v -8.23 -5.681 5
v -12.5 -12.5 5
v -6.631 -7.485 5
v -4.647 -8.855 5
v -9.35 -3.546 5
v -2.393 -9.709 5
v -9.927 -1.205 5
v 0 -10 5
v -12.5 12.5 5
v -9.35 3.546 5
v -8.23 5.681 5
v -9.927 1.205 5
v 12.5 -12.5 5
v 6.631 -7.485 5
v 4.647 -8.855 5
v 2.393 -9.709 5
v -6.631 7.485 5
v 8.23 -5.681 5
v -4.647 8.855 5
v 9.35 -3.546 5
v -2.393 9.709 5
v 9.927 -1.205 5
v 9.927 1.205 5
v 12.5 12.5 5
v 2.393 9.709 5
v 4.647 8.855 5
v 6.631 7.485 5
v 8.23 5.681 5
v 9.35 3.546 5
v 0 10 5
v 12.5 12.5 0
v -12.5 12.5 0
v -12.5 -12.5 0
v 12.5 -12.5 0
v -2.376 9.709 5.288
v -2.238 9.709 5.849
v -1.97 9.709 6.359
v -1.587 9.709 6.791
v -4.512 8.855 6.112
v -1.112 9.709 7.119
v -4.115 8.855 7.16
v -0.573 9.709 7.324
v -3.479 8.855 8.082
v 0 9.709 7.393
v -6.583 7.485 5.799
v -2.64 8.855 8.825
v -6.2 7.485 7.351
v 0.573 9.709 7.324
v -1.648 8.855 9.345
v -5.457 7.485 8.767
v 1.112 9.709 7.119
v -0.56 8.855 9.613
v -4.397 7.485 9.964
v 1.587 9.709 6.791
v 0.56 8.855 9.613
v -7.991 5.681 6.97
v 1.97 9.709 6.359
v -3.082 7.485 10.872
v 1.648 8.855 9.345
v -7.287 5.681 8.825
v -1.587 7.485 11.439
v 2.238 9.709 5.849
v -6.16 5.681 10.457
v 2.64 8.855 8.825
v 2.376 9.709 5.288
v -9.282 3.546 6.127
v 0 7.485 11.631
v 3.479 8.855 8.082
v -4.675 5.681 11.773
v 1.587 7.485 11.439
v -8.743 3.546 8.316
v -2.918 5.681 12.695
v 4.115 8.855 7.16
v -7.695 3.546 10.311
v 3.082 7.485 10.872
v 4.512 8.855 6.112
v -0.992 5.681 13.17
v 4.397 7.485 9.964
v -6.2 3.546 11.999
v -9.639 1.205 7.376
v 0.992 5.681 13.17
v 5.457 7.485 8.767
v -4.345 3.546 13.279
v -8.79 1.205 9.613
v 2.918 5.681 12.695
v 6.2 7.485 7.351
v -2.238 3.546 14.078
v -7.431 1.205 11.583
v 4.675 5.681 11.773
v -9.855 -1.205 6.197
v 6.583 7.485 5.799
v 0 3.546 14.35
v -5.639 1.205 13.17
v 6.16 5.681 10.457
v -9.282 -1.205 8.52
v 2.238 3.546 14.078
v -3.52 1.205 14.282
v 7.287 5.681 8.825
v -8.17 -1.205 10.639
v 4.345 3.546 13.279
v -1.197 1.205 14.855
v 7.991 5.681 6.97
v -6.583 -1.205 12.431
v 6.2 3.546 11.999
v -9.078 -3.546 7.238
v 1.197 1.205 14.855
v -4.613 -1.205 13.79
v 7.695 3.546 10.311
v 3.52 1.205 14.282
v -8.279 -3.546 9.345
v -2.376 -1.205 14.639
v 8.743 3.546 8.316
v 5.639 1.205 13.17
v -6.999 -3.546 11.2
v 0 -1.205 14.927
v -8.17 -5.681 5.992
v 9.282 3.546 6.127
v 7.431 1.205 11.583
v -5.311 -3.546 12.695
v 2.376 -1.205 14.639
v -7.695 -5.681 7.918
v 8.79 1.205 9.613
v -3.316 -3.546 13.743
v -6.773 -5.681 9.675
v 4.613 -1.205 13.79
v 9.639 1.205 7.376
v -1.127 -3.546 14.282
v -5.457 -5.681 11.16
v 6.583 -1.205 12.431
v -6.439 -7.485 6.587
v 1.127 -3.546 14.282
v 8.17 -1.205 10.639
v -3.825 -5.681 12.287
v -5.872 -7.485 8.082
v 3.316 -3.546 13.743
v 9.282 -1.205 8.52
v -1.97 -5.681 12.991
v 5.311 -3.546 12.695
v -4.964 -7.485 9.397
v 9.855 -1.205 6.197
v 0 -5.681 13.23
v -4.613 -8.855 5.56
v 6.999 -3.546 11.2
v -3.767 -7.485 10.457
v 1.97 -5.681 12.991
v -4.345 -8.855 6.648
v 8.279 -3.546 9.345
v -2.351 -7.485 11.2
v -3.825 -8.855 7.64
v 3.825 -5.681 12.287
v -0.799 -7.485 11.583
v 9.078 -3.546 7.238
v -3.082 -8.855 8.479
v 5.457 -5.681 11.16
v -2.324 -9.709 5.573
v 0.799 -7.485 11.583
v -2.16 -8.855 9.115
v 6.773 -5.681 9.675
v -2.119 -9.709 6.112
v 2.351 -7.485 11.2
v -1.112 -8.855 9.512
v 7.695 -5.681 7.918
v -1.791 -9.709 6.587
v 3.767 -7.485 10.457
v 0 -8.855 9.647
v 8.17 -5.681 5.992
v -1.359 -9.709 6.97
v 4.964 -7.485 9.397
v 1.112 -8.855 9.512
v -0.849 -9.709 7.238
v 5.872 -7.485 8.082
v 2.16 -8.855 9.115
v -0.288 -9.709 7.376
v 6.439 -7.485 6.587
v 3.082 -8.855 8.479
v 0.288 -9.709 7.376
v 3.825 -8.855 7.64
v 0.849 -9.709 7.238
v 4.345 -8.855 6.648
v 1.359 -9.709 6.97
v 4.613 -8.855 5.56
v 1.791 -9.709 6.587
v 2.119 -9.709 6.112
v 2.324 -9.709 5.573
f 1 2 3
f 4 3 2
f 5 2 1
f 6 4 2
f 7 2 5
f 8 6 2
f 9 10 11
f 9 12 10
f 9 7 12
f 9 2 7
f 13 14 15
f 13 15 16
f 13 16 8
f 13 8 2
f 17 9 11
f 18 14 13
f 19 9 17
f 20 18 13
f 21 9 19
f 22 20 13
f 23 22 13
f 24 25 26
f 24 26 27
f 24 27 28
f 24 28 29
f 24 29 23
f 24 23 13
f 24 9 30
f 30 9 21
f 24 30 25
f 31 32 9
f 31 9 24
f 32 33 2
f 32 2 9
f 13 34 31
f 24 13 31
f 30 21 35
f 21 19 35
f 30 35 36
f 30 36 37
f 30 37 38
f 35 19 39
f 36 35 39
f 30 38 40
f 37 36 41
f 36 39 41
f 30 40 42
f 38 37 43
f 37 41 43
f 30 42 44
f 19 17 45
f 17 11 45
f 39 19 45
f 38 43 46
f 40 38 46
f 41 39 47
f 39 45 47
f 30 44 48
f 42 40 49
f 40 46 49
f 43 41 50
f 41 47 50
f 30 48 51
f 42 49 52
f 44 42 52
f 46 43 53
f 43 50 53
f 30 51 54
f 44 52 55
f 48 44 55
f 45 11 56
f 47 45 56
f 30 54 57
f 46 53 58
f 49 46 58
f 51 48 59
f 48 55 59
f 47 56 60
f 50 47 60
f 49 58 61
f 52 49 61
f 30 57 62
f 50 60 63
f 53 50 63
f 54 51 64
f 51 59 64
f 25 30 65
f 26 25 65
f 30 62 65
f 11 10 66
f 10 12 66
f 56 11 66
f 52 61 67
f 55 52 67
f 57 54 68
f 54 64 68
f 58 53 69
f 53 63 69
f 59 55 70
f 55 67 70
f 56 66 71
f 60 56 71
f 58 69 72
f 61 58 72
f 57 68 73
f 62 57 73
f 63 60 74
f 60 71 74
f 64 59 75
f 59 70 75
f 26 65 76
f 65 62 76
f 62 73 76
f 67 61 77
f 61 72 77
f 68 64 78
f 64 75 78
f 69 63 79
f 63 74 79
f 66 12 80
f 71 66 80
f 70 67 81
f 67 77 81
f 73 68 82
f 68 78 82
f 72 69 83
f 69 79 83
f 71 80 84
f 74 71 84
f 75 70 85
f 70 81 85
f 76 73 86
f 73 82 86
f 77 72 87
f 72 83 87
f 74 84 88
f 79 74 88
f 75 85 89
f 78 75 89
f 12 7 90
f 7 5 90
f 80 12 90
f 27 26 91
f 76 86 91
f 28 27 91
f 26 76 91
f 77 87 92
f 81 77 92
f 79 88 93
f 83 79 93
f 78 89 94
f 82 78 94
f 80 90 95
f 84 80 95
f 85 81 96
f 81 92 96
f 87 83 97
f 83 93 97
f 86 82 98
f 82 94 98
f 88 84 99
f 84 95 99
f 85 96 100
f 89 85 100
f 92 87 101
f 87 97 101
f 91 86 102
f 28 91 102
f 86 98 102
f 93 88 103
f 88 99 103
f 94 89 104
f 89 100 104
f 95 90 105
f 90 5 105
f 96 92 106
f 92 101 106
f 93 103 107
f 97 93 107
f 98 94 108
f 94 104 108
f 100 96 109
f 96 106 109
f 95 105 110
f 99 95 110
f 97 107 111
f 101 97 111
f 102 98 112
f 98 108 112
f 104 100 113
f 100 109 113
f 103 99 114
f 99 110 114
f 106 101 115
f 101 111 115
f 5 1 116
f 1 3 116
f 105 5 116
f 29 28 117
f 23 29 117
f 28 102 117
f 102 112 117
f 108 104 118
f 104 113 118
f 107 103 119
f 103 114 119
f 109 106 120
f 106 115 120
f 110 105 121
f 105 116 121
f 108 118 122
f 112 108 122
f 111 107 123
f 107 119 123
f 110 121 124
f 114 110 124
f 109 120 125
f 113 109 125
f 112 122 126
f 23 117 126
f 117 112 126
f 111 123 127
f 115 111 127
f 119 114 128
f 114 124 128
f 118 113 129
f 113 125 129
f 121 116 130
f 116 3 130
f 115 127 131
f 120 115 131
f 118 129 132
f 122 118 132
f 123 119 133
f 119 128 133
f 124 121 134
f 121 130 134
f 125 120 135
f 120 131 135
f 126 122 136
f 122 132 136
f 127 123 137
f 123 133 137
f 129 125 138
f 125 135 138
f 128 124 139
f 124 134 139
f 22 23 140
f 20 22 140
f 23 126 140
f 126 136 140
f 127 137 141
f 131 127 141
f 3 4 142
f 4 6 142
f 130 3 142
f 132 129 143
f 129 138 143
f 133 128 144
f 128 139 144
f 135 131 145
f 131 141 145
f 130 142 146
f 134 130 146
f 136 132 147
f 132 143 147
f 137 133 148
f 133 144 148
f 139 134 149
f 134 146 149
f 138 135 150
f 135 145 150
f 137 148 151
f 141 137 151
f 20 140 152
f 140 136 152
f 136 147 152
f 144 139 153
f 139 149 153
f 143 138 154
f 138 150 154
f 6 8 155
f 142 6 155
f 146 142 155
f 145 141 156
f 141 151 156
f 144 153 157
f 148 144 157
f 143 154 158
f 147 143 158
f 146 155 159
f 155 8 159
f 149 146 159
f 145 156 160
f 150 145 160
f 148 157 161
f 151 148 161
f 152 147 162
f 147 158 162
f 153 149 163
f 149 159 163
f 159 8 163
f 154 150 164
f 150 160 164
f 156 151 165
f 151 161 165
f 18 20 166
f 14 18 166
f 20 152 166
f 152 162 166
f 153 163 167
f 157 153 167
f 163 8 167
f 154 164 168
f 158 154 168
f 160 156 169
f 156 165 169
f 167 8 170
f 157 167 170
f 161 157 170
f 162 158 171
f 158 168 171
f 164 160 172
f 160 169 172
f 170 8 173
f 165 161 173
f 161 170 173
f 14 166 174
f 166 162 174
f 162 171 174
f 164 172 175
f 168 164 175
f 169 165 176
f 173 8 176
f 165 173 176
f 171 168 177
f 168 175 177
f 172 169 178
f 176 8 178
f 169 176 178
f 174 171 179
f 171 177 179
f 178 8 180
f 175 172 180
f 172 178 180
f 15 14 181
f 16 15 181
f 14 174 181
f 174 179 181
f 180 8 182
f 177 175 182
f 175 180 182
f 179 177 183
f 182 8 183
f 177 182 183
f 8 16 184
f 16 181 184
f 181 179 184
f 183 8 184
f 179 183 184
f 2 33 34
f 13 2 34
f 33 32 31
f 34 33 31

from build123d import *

# Parameters (mm, degrees)
F0_W     = 25
F0_H     = 25
F1_DEPTH = 5
F3_ANGLE = 180


with BuildPart() as f1:
    # F0 (on Top) → F1 (new body)
    with BuildSketch(Plane.XY):
        Rectangle(F0_W, F0_H)
    extrude(amount=F1_DEPTH)

    # F2 (on face) → F3 (revolve)
    with BuildSketch(Plane.XY.offset(5)):
        with BuildLine():
            Line((0, -10), (0, 10))
            ThreePointArc((0, 10), (-10, 0), (0, -10))
        make_face()
    revolve(axis=Axis((0, 0, 5), (0, 1, 0)), revolution_arc=F3_ANGLE)


solid = f1.part
